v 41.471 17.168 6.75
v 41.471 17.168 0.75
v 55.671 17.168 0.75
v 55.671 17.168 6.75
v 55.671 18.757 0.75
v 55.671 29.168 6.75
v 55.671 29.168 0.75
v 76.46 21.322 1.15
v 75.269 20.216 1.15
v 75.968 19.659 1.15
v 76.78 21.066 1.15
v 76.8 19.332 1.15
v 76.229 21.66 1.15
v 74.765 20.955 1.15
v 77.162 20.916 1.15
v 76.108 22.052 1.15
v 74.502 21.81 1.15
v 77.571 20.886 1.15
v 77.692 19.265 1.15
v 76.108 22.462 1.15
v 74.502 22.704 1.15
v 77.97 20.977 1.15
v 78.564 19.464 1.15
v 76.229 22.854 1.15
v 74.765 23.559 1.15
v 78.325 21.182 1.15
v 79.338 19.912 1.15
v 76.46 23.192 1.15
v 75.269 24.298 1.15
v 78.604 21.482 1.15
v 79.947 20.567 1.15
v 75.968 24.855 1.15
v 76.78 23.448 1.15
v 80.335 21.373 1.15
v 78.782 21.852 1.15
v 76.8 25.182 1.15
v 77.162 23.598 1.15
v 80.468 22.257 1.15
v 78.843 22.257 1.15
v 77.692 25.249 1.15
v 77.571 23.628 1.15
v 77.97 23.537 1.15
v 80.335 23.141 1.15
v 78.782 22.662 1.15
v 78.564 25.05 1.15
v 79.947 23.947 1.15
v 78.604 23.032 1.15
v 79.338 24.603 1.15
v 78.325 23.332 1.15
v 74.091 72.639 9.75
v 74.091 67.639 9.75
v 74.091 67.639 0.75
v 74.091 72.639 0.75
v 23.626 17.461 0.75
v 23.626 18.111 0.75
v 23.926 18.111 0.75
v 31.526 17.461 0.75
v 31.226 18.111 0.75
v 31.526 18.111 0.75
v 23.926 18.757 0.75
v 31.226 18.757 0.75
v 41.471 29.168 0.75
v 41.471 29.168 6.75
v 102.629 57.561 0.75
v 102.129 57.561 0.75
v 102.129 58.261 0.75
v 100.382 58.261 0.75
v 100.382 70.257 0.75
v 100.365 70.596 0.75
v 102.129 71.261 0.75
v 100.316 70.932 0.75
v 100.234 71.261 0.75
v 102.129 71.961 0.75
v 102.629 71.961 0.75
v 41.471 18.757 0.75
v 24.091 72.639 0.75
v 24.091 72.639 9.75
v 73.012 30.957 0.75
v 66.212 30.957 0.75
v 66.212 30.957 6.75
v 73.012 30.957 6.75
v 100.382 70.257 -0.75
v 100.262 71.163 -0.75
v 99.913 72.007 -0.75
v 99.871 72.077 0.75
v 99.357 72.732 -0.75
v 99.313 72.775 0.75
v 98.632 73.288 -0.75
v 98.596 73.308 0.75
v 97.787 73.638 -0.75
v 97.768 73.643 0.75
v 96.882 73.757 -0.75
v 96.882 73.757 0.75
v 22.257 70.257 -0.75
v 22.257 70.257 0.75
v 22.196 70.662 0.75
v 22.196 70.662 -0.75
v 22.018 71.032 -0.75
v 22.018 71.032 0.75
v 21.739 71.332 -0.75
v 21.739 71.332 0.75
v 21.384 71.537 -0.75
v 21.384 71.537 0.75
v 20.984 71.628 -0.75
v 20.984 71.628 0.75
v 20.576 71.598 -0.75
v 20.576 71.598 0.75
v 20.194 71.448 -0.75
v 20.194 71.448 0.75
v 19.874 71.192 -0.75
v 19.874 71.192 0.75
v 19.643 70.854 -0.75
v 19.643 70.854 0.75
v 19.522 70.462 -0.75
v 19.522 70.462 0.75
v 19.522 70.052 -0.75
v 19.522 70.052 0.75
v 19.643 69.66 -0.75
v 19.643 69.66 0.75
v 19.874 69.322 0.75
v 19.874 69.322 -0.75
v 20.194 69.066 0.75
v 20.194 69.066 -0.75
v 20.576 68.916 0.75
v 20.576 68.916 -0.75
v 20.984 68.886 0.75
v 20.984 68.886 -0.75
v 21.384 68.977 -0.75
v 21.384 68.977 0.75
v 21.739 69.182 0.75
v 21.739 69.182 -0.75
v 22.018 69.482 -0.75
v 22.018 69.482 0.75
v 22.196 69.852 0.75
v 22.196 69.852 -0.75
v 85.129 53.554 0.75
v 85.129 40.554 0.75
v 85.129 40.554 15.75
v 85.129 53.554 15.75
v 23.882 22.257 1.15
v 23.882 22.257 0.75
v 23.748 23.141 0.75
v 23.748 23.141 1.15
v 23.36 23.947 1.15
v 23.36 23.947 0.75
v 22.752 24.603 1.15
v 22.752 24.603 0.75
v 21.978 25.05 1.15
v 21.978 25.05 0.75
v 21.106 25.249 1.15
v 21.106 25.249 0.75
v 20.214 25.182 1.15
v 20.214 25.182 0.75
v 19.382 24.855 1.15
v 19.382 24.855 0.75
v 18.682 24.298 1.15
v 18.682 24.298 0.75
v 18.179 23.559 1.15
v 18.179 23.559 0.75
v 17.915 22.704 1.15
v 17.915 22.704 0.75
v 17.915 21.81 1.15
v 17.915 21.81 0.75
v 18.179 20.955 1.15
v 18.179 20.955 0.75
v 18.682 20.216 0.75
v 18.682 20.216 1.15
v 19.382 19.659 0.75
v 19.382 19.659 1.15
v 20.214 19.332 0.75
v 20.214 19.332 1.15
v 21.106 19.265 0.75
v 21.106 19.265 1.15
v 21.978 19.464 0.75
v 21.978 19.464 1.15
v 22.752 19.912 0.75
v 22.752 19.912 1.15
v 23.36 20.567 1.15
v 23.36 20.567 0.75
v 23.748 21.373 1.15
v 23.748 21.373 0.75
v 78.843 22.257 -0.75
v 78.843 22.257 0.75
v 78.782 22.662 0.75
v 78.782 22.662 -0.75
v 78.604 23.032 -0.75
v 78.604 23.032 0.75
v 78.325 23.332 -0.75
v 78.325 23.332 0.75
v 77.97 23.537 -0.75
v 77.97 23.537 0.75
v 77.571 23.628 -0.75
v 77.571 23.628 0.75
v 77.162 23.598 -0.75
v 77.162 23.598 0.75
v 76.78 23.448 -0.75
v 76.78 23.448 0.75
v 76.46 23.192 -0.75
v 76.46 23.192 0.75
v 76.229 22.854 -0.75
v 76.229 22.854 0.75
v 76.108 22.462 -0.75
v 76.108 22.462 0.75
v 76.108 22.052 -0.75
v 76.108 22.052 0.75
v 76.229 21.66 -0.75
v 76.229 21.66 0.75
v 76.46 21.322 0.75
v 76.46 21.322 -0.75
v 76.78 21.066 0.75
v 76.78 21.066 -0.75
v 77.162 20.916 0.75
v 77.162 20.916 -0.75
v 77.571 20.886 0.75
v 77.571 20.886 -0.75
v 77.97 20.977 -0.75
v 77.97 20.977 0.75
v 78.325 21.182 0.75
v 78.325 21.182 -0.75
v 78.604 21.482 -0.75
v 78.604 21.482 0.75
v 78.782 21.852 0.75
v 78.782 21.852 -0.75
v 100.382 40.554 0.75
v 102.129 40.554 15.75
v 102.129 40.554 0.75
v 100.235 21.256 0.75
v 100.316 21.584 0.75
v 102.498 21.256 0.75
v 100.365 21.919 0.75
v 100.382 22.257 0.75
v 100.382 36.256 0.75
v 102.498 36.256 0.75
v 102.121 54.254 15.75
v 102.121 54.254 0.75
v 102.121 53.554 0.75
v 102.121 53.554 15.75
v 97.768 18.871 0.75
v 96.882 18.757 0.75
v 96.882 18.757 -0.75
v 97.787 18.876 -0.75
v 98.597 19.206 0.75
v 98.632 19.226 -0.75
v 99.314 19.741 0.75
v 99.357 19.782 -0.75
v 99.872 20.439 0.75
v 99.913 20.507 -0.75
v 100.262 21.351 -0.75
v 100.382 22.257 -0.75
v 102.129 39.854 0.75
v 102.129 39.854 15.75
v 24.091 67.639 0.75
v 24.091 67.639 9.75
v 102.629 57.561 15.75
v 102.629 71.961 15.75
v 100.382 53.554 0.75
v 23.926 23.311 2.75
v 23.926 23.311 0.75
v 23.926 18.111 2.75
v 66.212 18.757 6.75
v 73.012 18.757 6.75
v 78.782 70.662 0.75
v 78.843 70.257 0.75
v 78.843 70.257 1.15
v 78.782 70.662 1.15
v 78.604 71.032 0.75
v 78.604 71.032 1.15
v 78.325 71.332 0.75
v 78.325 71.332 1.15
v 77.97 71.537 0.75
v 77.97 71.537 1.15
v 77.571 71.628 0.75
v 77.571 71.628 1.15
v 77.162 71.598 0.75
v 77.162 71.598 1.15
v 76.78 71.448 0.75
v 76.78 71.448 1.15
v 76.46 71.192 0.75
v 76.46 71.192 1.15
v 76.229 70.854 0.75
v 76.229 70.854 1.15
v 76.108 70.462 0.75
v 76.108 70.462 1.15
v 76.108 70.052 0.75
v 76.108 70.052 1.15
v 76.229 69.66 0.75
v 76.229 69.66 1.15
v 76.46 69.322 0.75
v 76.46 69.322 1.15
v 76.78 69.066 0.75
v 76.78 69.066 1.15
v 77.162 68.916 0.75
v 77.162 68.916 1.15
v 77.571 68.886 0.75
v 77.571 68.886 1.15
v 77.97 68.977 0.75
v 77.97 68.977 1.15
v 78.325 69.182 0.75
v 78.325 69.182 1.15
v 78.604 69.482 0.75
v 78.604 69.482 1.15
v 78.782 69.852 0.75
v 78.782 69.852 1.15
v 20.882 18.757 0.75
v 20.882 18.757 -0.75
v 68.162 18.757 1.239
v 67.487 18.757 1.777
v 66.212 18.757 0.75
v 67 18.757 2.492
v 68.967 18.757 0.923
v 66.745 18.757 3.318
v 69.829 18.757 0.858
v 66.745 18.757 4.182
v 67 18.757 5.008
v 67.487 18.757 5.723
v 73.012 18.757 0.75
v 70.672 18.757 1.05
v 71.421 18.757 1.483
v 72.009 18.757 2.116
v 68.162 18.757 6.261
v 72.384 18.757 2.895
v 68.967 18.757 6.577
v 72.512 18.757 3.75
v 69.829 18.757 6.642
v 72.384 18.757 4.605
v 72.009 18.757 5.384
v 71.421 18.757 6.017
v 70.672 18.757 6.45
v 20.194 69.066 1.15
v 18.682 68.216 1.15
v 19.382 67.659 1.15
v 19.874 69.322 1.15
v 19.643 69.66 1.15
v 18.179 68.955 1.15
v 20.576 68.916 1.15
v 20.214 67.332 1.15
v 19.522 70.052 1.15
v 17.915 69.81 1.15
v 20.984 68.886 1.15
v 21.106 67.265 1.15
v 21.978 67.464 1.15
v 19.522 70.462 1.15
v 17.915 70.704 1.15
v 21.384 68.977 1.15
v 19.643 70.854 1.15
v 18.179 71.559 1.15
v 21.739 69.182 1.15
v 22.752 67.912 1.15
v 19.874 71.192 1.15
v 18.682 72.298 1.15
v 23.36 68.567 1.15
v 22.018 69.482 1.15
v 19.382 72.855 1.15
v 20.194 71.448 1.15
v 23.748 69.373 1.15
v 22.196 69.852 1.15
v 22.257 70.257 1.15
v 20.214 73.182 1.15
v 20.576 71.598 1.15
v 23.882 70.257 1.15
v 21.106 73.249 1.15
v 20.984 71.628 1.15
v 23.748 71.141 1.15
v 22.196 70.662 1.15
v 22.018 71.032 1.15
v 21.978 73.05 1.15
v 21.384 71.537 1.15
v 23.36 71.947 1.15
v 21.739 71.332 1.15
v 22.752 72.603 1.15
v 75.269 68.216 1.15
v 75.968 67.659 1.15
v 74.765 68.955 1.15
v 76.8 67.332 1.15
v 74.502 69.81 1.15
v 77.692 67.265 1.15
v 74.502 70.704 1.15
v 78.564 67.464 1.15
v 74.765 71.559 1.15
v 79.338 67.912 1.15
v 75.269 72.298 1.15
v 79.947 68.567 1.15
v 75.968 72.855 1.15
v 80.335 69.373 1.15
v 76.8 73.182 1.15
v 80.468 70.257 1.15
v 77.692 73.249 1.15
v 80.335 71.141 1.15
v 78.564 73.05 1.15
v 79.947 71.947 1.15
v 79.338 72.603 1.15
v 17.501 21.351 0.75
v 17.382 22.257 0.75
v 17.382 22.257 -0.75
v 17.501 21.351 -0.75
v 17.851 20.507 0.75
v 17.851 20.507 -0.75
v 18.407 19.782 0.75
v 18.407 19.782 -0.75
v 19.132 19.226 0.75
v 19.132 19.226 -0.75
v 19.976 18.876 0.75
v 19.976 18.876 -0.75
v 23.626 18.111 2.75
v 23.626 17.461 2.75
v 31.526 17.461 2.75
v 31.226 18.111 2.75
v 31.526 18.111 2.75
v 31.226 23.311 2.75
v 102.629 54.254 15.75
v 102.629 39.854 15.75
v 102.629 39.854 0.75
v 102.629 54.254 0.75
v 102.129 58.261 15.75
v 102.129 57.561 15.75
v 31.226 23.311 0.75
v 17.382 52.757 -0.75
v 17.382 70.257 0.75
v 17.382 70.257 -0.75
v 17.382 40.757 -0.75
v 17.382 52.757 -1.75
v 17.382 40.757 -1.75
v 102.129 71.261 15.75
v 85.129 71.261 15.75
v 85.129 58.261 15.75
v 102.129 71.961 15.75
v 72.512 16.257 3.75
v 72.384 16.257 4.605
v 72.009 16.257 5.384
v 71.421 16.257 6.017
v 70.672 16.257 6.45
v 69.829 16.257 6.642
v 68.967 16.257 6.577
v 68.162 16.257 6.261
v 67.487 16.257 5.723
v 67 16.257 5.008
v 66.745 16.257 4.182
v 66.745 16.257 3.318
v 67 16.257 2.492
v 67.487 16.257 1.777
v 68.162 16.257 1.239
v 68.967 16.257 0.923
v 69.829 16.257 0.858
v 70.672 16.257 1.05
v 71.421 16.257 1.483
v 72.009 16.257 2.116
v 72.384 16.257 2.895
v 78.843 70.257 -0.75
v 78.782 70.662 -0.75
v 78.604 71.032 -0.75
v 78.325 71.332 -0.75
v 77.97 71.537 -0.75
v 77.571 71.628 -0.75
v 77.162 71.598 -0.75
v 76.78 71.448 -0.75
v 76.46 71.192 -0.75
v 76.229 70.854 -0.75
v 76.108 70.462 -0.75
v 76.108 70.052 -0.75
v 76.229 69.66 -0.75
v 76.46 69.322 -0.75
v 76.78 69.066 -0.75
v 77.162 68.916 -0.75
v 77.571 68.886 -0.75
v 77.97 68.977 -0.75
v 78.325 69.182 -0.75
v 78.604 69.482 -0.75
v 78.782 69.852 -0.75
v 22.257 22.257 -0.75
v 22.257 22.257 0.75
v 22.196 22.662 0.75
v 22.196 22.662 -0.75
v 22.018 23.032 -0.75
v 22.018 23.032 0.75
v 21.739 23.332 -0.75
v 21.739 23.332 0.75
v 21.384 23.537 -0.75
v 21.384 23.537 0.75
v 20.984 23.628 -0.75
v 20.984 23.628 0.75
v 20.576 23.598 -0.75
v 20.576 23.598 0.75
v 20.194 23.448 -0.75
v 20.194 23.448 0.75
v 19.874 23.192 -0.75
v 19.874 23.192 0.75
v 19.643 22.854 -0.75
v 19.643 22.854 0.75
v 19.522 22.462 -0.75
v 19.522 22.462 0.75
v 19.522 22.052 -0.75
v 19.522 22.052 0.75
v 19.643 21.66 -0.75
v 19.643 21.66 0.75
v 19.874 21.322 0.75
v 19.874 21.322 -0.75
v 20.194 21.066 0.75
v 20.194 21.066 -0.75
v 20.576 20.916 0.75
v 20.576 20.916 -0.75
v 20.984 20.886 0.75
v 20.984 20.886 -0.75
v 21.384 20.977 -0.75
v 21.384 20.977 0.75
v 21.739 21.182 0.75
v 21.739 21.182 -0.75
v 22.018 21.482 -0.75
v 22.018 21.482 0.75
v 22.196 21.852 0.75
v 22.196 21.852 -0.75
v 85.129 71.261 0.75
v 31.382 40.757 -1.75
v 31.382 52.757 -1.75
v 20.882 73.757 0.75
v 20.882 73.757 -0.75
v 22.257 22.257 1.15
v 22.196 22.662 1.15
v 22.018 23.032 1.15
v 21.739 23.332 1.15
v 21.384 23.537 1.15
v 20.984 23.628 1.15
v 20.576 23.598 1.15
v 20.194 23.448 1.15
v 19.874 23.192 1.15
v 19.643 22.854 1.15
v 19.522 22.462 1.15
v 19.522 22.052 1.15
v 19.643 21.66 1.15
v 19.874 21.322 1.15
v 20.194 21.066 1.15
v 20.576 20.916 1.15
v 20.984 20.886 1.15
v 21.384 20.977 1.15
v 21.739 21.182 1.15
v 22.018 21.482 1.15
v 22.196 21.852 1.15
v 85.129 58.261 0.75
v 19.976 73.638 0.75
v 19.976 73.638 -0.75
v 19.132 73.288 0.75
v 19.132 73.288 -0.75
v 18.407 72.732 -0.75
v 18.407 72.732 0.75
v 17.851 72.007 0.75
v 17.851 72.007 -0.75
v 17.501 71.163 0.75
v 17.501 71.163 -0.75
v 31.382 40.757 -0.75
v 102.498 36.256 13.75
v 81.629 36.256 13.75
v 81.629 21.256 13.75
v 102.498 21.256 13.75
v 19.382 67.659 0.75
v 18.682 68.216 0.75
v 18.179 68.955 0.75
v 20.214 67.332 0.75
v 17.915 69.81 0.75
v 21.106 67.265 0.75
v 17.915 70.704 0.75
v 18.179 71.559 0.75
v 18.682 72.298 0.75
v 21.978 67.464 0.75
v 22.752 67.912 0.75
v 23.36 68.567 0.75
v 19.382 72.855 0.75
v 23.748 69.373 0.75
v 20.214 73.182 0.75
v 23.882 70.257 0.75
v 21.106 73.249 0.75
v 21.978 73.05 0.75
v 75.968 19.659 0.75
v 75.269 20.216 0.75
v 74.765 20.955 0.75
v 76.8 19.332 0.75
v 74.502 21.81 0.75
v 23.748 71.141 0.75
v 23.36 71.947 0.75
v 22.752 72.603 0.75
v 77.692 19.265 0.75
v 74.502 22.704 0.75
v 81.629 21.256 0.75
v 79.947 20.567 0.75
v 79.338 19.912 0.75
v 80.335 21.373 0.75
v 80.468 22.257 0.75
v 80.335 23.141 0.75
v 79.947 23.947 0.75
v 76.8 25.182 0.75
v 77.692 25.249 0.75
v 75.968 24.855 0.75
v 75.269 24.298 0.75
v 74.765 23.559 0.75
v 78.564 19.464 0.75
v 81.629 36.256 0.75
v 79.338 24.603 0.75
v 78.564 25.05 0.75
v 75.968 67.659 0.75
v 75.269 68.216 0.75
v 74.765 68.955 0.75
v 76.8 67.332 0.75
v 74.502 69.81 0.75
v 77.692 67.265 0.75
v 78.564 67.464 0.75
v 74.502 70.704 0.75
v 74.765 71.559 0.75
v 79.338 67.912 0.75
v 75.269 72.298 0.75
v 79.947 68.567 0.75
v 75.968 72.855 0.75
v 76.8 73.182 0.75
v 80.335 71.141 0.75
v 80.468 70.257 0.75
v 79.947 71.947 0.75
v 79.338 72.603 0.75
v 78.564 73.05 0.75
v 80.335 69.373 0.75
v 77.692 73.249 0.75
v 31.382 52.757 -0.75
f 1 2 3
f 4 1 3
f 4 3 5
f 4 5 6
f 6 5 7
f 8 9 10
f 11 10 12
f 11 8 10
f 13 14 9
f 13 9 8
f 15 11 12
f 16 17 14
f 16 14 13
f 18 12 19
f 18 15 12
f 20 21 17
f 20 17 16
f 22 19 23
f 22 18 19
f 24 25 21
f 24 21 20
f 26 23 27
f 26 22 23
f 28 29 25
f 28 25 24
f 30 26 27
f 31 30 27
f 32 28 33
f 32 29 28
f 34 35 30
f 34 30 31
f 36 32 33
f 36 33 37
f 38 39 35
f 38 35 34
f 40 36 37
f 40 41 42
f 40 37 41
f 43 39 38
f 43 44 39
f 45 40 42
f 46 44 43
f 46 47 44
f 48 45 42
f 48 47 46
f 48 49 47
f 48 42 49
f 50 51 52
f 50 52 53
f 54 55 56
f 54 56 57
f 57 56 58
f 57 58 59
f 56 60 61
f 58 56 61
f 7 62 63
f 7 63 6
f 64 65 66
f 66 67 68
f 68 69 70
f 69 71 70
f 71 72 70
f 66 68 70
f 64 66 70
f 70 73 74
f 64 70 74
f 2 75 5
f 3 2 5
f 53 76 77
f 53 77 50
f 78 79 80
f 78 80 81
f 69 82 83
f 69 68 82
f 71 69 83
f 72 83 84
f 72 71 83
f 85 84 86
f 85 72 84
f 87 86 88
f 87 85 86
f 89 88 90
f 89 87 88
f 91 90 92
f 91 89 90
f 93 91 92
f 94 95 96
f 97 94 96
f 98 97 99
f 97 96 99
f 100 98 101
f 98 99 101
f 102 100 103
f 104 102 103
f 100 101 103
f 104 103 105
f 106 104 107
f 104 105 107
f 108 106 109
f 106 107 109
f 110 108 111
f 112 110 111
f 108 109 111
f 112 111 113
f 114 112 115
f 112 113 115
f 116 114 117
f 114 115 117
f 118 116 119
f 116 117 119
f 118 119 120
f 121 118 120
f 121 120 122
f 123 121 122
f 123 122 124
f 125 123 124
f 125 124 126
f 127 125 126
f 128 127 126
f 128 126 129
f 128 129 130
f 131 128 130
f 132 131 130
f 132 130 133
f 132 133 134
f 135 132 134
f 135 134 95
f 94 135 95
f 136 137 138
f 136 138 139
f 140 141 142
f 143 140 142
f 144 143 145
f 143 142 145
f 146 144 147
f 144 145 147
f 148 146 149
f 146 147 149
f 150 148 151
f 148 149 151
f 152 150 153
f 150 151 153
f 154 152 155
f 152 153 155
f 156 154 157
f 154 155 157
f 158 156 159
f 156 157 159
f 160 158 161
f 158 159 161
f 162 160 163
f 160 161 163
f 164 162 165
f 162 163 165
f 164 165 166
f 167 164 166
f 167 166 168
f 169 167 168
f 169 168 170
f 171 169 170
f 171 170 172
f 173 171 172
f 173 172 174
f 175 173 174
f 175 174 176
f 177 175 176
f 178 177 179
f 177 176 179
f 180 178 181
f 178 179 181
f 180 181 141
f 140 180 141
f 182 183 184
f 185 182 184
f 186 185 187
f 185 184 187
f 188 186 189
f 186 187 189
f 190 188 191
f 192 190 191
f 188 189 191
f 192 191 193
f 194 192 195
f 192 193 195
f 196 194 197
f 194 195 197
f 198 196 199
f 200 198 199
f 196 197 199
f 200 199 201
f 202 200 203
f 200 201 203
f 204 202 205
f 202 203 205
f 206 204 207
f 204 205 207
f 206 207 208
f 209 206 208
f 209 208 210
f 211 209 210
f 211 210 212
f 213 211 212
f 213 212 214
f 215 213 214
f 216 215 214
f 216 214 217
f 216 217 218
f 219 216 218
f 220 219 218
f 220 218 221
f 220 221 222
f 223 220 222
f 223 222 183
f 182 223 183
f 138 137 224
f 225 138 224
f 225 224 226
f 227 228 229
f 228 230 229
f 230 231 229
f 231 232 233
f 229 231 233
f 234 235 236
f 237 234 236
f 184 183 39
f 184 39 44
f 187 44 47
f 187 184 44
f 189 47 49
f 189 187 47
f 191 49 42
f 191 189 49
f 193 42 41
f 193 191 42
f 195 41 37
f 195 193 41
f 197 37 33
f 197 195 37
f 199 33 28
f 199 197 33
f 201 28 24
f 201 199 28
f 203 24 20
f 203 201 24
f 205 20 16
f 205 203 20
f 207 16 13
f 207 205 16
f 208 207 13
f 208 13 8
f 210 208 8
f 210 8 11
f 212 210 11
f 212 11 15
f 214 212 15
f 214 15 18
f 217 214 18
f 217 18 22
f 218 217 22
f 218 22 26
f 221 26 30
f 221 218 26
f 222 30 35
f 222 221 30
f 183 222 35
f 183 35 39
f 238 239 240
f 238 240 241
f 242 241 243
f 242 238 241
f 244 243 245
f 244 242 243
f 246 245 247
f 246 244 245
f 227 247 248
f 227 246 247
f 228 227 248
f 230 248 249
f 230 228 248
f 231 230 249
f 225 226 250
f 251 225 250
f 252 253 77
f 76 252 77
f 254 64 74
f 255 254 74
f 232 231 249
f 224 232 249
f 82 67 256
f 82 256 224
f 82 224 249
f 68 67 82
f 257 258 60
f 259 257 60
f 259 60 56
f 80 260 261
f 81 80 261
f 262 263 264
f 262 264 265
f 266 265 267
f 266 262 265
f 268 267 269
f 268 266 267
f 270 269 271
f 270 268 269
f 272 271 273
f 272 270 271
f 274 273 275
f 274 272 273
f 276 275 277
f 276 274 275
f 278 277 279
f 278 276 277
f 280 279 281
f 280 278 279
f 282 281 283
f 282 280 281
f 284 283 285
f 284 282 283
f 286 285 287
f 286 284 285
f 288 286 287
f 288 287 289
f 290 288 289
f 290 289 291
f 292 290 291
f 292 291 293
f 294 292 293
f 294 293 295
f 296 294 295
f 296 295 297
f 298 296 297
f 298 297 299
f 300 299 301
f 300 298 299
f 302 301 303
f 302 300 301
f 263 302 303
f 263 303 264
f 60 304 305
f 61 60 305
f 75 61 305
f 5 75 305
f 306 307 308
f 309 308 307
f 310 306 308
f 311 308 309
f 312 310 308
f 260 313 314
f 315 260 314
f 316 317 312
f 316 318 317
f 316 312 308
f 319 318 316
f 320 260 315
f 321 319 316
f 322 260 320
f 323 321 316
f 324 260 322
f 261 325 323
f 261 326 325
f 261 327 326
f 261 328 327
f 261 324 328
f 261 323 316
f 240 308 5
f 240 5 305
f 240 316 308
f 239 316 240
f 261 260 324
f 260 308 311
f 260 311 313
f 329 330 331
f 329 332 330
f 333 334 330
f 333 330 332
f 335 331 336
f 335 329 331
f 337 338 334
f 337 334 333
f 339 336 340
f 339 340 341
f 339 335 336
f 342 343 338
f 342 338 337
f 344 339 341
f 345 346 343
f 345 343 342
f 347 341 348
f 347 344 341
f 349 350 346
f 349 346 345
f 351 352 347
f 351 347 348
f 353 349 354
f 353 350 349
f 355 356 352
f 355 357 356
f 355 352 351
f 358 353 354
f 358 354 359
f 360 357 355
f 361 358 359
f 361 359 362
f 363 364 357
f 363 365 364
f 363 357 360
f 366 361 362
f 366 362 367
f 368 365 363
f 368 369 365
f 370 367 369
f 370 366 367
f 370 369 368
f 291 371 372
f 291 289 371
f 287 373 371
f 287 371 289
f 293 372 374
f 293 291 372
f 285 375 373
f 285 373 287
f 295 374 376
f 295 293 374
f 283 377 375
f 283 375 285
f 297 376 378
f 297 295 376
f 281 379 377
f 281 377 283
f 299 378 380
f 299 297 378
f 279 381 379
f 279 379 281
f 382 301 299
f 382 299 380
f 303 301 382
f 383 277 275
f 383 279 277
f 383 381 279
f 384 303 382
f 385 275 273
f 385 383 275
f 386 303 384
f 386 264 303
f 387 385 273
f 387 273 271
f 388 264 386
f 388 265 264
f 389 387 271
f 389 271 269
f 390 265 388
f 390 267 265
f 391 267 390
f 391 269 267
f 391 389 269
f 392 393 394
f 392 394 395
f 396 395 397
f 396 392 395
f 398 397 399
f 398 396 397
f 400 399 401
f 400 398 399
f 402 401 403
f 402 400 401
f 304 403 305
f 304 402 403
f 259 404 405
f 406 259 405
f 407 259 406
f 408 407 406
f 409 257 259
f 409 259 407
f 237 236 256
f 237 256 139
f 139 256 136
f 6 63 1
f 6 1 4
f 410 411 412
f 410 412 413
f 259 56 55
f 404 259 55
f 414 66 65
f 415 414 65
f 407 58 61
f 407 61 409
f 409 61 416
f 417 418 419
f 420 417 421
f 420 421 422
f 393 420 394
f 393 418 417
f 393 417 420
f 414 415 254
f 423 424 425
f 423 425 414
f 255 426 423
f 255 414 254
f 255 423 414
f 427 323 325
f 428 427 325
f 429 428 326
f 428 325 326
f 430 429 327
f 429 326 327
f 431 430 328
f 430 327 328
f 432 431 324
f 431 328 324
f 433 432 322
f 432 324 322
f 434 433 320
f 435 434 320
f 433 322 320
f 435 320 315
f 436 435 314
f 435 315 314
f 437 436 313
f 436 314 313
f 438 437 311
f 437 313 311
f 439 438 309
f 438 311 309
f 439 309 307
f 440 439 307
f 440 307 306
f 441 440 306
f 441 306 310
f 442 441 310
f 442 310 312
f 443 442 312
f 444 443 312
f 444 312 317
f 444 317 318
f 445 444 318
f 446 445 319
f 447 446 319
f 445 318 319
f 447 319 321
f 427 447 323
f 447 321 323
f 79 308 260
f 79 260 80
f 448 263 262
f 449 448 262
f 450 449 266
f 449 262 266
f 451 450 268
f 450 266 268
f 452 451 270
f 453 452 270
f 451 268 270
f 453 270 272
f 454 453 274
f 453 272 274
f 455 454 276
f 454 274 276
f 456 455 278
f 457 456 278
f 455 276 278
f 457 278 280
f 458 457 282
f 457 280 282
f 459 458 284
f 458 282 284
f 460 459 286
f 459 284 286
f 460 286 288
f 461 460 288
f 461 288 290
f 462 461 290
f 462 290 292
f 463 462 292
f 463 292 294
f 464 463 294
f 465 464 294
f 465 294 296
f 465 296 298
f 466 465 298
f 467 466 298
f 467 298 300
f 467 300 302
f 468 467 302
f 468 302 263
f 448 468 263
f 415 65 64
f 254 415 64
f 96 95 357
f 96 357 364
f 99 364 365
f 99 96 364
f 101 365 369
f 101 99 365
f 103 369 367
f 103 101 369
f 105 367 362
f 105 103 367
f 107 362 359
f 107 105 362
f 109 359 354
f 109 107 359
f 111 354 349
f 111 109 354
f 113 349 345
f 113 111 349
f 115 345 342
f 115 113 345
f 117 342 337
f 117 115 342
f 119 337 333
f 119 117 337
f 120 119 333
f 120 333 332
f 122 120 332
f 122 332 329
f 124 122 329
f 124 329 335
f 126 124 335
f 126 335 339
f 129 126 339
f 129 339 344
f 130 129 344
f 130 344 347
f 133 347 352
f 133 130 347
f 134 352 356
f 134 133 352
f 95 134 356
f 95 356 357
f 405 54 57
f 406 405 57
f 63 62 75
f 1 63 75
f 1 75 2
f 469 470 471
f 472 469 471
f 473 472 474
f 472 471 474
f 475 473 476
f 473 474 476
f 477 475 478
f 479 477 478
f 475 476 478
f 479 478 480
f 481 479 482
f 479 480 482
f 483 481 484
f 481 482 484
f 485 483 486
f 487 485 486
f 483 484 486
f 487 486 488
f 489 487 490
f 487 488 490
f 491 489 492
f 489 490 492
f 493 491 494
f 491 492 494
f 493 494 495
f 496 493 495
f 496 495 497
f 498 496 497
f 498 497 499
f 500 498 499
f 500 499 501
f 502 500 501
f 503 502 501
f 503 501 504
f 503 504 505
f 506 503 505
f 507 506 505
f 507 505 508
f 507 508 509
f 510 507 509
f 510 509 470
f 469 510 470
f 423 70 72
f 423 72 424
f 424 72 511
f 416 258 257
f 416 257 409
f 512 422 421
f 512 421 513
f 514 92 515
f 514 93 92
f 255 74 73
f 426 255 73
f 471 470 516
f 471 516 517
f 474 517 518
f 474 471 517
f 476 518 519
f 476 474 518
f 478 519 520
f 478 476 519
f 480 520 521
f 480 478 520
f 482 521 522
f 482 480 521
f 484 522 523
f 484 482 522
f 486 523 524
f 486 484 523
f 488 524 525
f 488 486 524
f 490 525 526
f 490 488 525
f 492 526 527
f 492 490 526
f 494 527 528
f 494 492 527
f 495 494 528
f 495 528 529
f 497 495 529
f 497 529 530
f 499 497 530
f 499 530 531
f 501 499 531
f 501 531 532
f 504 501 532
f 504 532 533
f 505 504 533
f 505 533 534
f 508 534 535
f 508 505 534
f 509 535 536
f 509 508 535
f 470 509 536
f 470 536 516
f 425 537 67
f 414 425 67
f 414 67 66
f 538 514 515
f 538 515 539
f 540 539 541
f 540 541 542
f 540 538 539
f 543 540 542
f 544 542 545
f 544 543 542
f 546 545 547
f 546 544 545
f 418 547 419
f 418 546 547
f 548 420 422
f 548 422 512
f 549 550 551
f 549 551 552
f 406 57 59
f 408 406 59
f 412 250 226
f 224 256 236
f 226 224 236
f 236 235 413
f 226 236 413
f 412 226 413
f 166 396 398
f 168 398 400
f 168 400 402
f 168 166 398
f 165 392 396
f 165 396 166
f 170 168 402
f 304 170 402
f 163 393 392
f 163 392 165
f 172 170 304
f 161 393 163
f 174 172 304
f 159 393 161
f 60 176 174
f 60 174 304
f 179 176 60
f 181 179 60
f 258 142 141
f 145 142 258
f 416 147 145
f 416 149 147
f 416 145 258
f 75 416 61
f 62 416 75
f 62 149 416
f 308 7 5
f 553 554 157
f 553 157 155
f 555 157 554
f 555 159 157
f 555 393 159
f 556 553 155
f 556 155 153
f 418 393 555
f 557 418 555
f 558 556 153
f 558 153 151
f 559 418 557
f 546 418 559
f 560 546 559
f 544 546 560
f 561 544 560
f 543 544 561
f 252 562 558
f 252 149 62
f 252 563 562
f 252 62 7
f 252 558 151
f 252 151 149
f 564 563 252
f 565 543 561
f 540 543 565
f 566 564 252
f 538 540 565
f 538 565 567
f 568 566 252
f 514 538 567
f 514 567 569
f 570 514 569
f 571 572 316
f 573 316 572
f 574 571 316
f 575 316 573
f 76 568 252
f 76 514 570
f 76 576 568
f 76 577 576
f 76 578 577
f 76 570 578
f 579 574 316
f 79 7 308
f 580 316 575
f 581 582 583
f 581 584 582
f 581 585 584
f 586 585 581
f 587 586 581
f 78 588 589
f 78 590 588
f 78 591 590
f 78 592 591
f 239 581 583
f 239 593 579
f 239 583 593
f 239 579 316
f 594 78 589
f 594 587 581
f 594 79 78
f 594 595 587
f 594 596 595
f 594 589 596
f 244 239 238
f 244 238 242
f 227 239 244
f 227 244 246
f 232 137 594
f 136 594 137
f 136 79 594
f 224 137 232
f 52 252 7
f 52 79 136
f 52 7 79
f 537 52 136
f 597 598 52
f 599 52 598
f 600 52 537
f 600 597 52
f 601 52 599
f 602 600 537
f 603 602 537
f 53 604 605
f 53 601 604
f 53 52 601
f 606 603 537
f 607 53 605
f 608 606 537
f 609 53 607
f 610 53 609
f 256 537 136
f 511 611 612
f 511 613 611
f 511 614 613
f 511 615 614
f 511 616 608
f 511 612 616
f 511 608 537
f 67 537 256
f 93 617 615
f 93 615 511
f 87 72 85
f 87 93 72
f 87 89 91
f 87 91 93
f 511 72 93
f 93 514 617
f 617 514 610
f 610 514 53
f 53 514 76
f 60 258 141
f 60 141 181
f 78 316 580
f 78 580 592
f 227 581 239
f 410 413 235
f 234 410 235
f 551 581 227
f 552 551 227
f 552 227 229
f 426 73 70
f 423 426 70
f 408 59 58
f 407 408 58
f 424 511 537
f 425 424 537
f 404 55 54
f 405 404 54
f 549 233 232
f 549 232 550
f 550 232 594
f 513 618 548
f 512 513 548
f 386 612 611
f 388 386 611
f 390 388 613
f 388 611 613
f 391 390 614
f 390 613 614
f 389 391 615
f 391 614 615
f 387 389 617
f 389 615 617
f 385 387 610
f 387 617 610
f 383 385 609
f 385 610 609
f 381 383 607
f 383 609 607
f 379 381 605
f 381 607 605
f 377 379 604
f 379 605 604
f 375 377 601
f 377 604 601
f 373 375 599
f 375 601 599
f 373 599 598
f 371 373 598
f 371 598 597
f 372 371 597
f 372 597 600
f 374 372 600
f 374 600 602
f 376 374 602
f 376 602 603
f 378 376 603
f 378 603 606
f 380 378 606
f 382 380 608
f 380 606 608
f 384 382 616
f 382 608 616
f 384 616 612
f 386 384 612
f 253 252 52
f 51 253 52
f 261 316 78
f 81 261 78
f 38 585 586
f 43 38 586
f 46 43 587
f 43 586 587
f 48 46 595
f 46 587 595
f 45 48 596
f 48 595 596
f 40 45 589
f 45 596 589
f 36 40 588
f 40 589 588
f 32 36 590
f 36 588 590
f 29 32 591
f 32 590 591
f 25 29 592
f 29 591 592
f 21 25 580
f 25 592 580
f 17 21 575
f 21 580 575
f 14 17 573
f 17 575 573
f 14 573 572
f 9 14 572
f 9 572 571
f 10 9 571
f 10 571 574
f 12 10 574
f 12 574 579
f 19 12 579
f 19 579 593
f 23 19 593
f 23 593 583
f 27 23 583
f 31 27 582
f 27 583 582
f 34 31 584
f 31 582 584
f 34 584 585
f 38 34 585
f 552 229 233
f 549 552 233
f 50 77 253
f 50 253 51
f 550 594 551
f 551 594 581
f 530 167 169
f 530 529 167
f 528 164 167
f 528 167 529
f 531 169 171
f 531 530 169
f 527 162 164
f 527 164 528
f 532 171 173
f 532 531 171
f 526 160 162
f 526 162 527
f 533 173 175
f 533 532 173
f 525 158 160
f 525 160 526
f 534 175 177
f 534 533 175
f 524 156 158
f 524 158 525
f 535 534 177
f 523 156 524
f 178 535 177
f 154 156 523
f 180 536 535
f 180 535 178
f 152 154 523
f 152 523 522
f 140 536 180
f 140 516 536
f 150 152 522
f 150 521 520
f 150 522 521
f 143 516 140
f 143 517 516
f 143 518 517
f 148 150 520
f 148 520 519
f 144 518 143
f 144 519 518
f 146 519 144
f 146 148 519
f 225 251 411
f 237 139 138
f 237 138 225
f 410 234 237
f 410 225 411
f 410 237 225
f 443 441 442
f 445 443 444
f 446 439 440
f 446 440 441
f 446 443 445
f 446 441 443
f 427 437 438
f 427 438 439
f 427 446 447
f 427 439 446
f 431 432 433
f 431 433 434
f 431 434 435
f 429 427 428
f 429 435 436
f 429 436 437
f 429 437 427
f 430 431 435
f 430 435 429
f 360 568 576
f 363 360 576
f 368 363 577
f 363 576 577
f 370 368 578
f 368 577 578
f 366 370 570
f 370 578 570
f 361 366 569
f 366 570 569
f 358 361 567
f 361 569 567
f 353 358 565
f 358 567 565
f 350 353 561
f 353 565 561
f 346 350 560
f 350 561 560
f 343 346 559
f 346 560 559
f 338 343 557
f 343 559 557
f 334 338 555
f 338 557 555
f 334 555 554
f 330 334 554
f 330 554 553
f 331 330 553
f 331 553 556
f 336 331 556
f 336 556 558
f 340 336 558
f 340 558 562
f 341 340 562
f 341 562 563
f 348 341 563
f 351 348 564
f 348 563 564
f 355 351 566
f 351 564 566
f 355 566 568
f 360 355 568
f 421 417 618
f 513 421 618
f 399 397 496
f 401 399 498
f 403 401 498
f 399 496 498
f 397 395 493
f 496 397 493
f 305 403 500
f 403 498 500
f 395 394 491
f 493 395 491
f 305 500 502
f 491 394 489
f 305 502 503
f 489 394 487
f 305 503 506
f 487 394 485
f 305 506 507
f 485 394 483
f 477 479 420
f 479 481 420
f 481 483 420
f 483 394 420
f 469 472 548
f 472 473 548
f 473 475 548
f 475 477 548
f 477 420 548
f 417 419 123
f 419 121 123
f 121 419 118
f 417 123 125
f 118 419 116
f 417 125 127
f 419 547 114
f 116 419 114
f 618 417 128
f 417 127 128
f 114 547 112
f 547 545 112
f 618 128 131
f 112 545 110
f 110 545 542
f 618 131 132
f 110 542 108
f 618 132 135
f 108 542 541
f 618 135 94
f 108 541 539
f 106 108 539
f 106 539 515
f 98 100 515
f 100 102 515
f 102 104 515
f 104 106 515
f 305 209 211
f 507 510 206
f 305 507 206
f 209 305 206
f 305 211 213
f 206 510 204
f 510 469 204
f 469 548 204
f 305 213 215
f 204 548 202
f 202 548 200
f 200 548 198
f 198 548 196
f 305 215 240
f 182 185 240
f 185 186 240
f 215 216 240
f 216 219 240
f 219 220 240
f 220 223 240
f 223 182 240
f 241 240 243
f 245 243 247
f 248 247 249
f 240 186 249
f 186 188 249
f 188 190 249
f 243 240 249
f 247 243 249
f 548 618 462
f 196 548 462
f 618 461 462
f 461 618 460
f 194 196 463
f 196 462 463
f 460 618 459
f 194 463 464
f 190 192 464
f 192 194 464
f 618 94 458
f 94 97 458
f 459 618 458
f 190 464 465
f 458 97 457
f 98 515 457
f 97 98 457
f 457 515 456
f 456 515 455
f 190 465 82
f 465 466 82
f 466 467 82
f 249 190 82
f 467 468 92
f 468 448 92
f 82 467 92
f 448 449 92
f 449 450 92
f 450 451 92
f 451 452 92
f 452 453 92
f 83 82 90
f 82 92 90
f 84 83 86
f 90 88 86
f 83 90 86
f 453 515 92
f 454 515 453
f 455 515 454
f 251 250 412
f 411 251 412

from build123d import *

# Parameters (mm, degrees)
F1_DEPTH  = 0.75
F2_W      = 15.2527261972
F2_H      = 13
F3_DEPTH  = 15
F4_DEPTH  = 2
F5_W      = 50
F5_H      = 5
F6_DEPTH  = 9
F7_W      = 7.3
F7_H      = 4.5542112009
F7_W_2    = 14.2
F7_H_2    = 10.4107348667
F7_W_3    = 6.8
F7_H_3    = 12.2
F7_H_4    = 1.5892651333
F8_DEPTH  = 6
F9_DEPTH  = 4
F10_W     = 14
F10_H     = 12
F11_DEPTH = 1
F12_R     = 2.9
F13_DEPTH = 2.5
F14_R     = 3
F14_R_2   = 1.375
F15_DEPTH = 0.4
F16_DEPTH = 25


with BuildPart() as f1:
    # F0 (on Top) → F1 (new body, symmetric)
    with BuildSketch(Plane.XY):
        with BuildLine():
            Line((96.8816299438, 73.7570084287), (20.8816299438, 73.7570084287))
            ThreePointArc((20.8816299438, 73.7570084287), (18.4067562097, 72.7318821628), (17.3816299438, 70.2570084287))
            Line((17.3816299438, 70.2570084287), (17.3816299438, 22.2570084287))
            ThreePointArc((17.3816299438, 22.2570084287), (18.4067562097, 19.7821346945), (20.8816299438, 18.7570084287))
            Line((20.8816299438, 18.7570084287), (96.8816299438, 18.7570084287))
            ThreePointArc((96.8816299438, 18.7570084287), (99.356503678, 19.7821346945), (100.3816299438, 22.2570084287))
            Line((100.3816299438, 22.2570084287), (100.3816299438, 70.2570084287))
            ThreePointArc((100.3816299438, 70.2570084287), (99.356503678, 72.7318821628), (96.8816299438, 73.7570084287))
        make_face()
    extrude(amount=F1_DEPTH, both=True)

    # F2 (on face) → F3 (join)
    with BuildSketch(Plane.XY.offset(0.75)):
        with BuildLine():
            Line((100.2344762848, 71.2612103079), (85.1289037466, 71.2612103079))
            Line((85.1289037466, 71.2612103079), (85.1289037466, 58.2612103079))
            Line((85.1289037466, 58.2612103079), (100.3816299438, 58.2612103079))
            Line((100.3816299438, 58.2612103079), (100.3816299438, 70.2570084287))
            ThreePointArc((100.3816299438, 70.2570084287), (100.3446461287, 70.7644716327), (100.2344762848, 71.2612103079))
        make_face()
        with BuildLine():
            Line((102.1289037466, 71.2612103079), (100.2344762848, 71.2612103079))
            ThreePointArc((100.2344762848, 71.2612103079), (100.3446461287, 70.7644716327), (100.3816299438, 70.2570084287))
            Line((100.3816299438, 70.2570084287), (100.3816299438, 58.2612103079))
            Line((100.3816299438, 58.2612103079), (102.1289037466, 58.2612103079))
            Line((102.1289037466, 58.2612103079), (102.1289037466, 57.5612103079))
            Line((102.1289037466, 57.5612103079), (102.6289037466, 57.5612103079))
            Line((102.6289037466, 57.5612103079), (102.6289037466, 71.9612103079))
            Line((102.6289037466, 71.9612103079), (102.1289037466, 71.9612103079))
            Line((102.1289037466, 71.9612103079), (102.1289037466, 71.2612103079))
        make_face()
        Polygon((102.1210900545, 53.5538156629), (100.3816299438, 53.5538156629), (100.3816299438, 40.5538156629), (102.1289037466, 40.5538156629), (102.1289037466, 39.8538156629), (102.6289037466, 39.8538156629), (102.6289037466, 54.2538156629), (102.1210900545, 54.2538156629), align=None)
        with Locations((92.7552668452, 47.0538156629)):
            Rectangle(F2_W, F2_H)
        with BuildLine():
            Line((100.3816299438, 22.2570084287), (100.3816299438, 36.2560376525))
            Line((100.3816299438, 36.2560376525), (85.1289037466, 36.2560376525))
            Line((85.1289037466, 36.2560376525), (81.6289037466, 36.2560376525))
            Line((81.6289037466, 36.2560376525), (81.6289037466, 21.2560376525))
            Line((81.6289037466, 21.2560376525), (85.1289037466, 21.2560376525))
            Line((85.1289037466, 21.2560376525), (100.2354423276, 21.2560376525))
            ThreePointArc((100.2354423276, 21.2560376525), (100.3448902101, 21.7512136793), (100.3816299438, 22.2570084287))
        make_face()
        with BuildLine():
            Line((102.4976894259, 36.2560376525), (100.3816299438, 36.2560376525))
            Line((100.3816299438, 36.2560376525), (100.3816299438, 22.2570084287))
            ThreePointArc((100.3816299438, 22.2570084287), (100.3448902101, 21.7512136793), (100.2354423276, 21.2560376525))
            Line((100.2354423276, 21.2560376525), (102.4976894259, 21.2560376525))
            Line((102.4976894259, 21.2560376525), (102.4976894259, 36.2560376525))
        make_face()
    extrude(amount=F3_DEPTH)

    # F4 (cut): a face of the model
    f4_faces = [f1.faces().sort_by_distance(p)[0] for p in [
        (92.0632965863, 28.7560376525, 15.75),
    ]]
    extrude(f4_faces, amount=-F4_DEPTH, mode=Mode.SUBTRACT)

    # F5 (on face) → F6 (join)
    with BuildSketch(Plane.XY.offset(0.75)):
        with Locations((49.090506424, 70.1389685273)):
            Rectangle(F5_W, F5_H)
    extrude(amount=F6_DEPTH)

    # F7 (on face) → F8 (join)
    with BuildSketch(Plane.XY.offset(0.75)):
        with Locations((27.5762250692, 21.0341140292)):
            Rectangle(F7_W, F7_H)
        Polygon((31.2262250692, 18.7570084287), (23.9262250692, 18.7570084287), (23.9262250692, 18.1112196296), (23.6262250692, 18.1112196296), (23.6262250692, 17.4612196296), (31.5262250692, 17.4612196296), (31.5262250692, 18.1112196296), (31.2262250692, 18.1112196296), align=None)
        with Locations((48.5707884192, 23.9623758621)):
            Rectangle(F7_W_2, F7_H_2)
        with Locations((69.6124156952, 24.8570084287)):
            Rectangle(F7_W_3, F7_H_3)
        with Locations((48.5707884192, 17.9623758621)):
            Rectangle(F7_W_2, F7_H_4)
    extrude(amount=F8_DEPTH)

    # F9 (cut): a face of the model
    f9_faces = [f1.faces().sort_by_distance(p)[0] for p in [
        (27.5762250692, 20.3626902179, 6.75),
    ]]
    extrude(f9_faces, amount=-F9_DEPTH, mode=Mode.SUBTRACT)

    # F10 (on face) → F11 (join)
    with BuildSketch(Plane(origin=(0, 0, -0.75), x_dir=(1, 0, 0), z_dir=(0, 0, -1))):
        with Locations((24.3816299438, -46.7570084287)):
            Rectangle(F10_W, F10_H)
    extrude(amount=F11_DEPTH)

    # F12 (on face) → F13 (join)
    with BuildSketch(Plane.XZ.offset(-18.7570084287)):
        with Locations((69.6124156952, 3.75)):
            Circle(F12_R)
    extrude(amount=F13_DEPTH)

    # F14 (on face) → F15 (join)
    with BuildSketch(Plane.XY.offset(0.75)):
        with Locations((77.4679929018, 70.2570084287)):
            Circle(F14_R)
        with Locations((77.4679929018, 70.2570084287)):
            Circle(F14_R_2, mode=Mode.SUBTRACT)
        with Locations((20.8816299438, 70.2570084287)):
            Circle(F14_R)
        with Locations((20.8816299438, 70.2570084287)):
            Circle(F14_R_2, mode=Mode.SUBTRACT)
        with Locations((20.8816299438, 22.2570084287)):
            Circle(F14_R)
        with Locations((20.8816299438, 22.2570084287)):
            Circle(F14_R_2, mode=Mode.SUBTRACT)
        with Locations((77.4679929018, 22.2570084287)):
            Circle(F14_R)
        with Locations((77.4679929018, 22.2570084287)):
            Circle(F14_R_2, mode=Mode.SUBTRACT)
    extrude(amount=F15_DEPTH)

    # F16 (cut): faces of the model
    f16_faces = [f1.faces().sort_by_distance(p)[0] for p in [
        (77.4679929018, 70.2570084287, 0.75),
        (77.4679929018, 22.2570084287, 0.75),
        (20.8816299438, 22.2570084287, 0.75),
        (20.8816299438, 70.2570084287, 0.75),
    ]]
    extrude(f16_faces, amount=-F16_DEPTH, mode=Mode.SUBTRACT)


solid = f1.part
